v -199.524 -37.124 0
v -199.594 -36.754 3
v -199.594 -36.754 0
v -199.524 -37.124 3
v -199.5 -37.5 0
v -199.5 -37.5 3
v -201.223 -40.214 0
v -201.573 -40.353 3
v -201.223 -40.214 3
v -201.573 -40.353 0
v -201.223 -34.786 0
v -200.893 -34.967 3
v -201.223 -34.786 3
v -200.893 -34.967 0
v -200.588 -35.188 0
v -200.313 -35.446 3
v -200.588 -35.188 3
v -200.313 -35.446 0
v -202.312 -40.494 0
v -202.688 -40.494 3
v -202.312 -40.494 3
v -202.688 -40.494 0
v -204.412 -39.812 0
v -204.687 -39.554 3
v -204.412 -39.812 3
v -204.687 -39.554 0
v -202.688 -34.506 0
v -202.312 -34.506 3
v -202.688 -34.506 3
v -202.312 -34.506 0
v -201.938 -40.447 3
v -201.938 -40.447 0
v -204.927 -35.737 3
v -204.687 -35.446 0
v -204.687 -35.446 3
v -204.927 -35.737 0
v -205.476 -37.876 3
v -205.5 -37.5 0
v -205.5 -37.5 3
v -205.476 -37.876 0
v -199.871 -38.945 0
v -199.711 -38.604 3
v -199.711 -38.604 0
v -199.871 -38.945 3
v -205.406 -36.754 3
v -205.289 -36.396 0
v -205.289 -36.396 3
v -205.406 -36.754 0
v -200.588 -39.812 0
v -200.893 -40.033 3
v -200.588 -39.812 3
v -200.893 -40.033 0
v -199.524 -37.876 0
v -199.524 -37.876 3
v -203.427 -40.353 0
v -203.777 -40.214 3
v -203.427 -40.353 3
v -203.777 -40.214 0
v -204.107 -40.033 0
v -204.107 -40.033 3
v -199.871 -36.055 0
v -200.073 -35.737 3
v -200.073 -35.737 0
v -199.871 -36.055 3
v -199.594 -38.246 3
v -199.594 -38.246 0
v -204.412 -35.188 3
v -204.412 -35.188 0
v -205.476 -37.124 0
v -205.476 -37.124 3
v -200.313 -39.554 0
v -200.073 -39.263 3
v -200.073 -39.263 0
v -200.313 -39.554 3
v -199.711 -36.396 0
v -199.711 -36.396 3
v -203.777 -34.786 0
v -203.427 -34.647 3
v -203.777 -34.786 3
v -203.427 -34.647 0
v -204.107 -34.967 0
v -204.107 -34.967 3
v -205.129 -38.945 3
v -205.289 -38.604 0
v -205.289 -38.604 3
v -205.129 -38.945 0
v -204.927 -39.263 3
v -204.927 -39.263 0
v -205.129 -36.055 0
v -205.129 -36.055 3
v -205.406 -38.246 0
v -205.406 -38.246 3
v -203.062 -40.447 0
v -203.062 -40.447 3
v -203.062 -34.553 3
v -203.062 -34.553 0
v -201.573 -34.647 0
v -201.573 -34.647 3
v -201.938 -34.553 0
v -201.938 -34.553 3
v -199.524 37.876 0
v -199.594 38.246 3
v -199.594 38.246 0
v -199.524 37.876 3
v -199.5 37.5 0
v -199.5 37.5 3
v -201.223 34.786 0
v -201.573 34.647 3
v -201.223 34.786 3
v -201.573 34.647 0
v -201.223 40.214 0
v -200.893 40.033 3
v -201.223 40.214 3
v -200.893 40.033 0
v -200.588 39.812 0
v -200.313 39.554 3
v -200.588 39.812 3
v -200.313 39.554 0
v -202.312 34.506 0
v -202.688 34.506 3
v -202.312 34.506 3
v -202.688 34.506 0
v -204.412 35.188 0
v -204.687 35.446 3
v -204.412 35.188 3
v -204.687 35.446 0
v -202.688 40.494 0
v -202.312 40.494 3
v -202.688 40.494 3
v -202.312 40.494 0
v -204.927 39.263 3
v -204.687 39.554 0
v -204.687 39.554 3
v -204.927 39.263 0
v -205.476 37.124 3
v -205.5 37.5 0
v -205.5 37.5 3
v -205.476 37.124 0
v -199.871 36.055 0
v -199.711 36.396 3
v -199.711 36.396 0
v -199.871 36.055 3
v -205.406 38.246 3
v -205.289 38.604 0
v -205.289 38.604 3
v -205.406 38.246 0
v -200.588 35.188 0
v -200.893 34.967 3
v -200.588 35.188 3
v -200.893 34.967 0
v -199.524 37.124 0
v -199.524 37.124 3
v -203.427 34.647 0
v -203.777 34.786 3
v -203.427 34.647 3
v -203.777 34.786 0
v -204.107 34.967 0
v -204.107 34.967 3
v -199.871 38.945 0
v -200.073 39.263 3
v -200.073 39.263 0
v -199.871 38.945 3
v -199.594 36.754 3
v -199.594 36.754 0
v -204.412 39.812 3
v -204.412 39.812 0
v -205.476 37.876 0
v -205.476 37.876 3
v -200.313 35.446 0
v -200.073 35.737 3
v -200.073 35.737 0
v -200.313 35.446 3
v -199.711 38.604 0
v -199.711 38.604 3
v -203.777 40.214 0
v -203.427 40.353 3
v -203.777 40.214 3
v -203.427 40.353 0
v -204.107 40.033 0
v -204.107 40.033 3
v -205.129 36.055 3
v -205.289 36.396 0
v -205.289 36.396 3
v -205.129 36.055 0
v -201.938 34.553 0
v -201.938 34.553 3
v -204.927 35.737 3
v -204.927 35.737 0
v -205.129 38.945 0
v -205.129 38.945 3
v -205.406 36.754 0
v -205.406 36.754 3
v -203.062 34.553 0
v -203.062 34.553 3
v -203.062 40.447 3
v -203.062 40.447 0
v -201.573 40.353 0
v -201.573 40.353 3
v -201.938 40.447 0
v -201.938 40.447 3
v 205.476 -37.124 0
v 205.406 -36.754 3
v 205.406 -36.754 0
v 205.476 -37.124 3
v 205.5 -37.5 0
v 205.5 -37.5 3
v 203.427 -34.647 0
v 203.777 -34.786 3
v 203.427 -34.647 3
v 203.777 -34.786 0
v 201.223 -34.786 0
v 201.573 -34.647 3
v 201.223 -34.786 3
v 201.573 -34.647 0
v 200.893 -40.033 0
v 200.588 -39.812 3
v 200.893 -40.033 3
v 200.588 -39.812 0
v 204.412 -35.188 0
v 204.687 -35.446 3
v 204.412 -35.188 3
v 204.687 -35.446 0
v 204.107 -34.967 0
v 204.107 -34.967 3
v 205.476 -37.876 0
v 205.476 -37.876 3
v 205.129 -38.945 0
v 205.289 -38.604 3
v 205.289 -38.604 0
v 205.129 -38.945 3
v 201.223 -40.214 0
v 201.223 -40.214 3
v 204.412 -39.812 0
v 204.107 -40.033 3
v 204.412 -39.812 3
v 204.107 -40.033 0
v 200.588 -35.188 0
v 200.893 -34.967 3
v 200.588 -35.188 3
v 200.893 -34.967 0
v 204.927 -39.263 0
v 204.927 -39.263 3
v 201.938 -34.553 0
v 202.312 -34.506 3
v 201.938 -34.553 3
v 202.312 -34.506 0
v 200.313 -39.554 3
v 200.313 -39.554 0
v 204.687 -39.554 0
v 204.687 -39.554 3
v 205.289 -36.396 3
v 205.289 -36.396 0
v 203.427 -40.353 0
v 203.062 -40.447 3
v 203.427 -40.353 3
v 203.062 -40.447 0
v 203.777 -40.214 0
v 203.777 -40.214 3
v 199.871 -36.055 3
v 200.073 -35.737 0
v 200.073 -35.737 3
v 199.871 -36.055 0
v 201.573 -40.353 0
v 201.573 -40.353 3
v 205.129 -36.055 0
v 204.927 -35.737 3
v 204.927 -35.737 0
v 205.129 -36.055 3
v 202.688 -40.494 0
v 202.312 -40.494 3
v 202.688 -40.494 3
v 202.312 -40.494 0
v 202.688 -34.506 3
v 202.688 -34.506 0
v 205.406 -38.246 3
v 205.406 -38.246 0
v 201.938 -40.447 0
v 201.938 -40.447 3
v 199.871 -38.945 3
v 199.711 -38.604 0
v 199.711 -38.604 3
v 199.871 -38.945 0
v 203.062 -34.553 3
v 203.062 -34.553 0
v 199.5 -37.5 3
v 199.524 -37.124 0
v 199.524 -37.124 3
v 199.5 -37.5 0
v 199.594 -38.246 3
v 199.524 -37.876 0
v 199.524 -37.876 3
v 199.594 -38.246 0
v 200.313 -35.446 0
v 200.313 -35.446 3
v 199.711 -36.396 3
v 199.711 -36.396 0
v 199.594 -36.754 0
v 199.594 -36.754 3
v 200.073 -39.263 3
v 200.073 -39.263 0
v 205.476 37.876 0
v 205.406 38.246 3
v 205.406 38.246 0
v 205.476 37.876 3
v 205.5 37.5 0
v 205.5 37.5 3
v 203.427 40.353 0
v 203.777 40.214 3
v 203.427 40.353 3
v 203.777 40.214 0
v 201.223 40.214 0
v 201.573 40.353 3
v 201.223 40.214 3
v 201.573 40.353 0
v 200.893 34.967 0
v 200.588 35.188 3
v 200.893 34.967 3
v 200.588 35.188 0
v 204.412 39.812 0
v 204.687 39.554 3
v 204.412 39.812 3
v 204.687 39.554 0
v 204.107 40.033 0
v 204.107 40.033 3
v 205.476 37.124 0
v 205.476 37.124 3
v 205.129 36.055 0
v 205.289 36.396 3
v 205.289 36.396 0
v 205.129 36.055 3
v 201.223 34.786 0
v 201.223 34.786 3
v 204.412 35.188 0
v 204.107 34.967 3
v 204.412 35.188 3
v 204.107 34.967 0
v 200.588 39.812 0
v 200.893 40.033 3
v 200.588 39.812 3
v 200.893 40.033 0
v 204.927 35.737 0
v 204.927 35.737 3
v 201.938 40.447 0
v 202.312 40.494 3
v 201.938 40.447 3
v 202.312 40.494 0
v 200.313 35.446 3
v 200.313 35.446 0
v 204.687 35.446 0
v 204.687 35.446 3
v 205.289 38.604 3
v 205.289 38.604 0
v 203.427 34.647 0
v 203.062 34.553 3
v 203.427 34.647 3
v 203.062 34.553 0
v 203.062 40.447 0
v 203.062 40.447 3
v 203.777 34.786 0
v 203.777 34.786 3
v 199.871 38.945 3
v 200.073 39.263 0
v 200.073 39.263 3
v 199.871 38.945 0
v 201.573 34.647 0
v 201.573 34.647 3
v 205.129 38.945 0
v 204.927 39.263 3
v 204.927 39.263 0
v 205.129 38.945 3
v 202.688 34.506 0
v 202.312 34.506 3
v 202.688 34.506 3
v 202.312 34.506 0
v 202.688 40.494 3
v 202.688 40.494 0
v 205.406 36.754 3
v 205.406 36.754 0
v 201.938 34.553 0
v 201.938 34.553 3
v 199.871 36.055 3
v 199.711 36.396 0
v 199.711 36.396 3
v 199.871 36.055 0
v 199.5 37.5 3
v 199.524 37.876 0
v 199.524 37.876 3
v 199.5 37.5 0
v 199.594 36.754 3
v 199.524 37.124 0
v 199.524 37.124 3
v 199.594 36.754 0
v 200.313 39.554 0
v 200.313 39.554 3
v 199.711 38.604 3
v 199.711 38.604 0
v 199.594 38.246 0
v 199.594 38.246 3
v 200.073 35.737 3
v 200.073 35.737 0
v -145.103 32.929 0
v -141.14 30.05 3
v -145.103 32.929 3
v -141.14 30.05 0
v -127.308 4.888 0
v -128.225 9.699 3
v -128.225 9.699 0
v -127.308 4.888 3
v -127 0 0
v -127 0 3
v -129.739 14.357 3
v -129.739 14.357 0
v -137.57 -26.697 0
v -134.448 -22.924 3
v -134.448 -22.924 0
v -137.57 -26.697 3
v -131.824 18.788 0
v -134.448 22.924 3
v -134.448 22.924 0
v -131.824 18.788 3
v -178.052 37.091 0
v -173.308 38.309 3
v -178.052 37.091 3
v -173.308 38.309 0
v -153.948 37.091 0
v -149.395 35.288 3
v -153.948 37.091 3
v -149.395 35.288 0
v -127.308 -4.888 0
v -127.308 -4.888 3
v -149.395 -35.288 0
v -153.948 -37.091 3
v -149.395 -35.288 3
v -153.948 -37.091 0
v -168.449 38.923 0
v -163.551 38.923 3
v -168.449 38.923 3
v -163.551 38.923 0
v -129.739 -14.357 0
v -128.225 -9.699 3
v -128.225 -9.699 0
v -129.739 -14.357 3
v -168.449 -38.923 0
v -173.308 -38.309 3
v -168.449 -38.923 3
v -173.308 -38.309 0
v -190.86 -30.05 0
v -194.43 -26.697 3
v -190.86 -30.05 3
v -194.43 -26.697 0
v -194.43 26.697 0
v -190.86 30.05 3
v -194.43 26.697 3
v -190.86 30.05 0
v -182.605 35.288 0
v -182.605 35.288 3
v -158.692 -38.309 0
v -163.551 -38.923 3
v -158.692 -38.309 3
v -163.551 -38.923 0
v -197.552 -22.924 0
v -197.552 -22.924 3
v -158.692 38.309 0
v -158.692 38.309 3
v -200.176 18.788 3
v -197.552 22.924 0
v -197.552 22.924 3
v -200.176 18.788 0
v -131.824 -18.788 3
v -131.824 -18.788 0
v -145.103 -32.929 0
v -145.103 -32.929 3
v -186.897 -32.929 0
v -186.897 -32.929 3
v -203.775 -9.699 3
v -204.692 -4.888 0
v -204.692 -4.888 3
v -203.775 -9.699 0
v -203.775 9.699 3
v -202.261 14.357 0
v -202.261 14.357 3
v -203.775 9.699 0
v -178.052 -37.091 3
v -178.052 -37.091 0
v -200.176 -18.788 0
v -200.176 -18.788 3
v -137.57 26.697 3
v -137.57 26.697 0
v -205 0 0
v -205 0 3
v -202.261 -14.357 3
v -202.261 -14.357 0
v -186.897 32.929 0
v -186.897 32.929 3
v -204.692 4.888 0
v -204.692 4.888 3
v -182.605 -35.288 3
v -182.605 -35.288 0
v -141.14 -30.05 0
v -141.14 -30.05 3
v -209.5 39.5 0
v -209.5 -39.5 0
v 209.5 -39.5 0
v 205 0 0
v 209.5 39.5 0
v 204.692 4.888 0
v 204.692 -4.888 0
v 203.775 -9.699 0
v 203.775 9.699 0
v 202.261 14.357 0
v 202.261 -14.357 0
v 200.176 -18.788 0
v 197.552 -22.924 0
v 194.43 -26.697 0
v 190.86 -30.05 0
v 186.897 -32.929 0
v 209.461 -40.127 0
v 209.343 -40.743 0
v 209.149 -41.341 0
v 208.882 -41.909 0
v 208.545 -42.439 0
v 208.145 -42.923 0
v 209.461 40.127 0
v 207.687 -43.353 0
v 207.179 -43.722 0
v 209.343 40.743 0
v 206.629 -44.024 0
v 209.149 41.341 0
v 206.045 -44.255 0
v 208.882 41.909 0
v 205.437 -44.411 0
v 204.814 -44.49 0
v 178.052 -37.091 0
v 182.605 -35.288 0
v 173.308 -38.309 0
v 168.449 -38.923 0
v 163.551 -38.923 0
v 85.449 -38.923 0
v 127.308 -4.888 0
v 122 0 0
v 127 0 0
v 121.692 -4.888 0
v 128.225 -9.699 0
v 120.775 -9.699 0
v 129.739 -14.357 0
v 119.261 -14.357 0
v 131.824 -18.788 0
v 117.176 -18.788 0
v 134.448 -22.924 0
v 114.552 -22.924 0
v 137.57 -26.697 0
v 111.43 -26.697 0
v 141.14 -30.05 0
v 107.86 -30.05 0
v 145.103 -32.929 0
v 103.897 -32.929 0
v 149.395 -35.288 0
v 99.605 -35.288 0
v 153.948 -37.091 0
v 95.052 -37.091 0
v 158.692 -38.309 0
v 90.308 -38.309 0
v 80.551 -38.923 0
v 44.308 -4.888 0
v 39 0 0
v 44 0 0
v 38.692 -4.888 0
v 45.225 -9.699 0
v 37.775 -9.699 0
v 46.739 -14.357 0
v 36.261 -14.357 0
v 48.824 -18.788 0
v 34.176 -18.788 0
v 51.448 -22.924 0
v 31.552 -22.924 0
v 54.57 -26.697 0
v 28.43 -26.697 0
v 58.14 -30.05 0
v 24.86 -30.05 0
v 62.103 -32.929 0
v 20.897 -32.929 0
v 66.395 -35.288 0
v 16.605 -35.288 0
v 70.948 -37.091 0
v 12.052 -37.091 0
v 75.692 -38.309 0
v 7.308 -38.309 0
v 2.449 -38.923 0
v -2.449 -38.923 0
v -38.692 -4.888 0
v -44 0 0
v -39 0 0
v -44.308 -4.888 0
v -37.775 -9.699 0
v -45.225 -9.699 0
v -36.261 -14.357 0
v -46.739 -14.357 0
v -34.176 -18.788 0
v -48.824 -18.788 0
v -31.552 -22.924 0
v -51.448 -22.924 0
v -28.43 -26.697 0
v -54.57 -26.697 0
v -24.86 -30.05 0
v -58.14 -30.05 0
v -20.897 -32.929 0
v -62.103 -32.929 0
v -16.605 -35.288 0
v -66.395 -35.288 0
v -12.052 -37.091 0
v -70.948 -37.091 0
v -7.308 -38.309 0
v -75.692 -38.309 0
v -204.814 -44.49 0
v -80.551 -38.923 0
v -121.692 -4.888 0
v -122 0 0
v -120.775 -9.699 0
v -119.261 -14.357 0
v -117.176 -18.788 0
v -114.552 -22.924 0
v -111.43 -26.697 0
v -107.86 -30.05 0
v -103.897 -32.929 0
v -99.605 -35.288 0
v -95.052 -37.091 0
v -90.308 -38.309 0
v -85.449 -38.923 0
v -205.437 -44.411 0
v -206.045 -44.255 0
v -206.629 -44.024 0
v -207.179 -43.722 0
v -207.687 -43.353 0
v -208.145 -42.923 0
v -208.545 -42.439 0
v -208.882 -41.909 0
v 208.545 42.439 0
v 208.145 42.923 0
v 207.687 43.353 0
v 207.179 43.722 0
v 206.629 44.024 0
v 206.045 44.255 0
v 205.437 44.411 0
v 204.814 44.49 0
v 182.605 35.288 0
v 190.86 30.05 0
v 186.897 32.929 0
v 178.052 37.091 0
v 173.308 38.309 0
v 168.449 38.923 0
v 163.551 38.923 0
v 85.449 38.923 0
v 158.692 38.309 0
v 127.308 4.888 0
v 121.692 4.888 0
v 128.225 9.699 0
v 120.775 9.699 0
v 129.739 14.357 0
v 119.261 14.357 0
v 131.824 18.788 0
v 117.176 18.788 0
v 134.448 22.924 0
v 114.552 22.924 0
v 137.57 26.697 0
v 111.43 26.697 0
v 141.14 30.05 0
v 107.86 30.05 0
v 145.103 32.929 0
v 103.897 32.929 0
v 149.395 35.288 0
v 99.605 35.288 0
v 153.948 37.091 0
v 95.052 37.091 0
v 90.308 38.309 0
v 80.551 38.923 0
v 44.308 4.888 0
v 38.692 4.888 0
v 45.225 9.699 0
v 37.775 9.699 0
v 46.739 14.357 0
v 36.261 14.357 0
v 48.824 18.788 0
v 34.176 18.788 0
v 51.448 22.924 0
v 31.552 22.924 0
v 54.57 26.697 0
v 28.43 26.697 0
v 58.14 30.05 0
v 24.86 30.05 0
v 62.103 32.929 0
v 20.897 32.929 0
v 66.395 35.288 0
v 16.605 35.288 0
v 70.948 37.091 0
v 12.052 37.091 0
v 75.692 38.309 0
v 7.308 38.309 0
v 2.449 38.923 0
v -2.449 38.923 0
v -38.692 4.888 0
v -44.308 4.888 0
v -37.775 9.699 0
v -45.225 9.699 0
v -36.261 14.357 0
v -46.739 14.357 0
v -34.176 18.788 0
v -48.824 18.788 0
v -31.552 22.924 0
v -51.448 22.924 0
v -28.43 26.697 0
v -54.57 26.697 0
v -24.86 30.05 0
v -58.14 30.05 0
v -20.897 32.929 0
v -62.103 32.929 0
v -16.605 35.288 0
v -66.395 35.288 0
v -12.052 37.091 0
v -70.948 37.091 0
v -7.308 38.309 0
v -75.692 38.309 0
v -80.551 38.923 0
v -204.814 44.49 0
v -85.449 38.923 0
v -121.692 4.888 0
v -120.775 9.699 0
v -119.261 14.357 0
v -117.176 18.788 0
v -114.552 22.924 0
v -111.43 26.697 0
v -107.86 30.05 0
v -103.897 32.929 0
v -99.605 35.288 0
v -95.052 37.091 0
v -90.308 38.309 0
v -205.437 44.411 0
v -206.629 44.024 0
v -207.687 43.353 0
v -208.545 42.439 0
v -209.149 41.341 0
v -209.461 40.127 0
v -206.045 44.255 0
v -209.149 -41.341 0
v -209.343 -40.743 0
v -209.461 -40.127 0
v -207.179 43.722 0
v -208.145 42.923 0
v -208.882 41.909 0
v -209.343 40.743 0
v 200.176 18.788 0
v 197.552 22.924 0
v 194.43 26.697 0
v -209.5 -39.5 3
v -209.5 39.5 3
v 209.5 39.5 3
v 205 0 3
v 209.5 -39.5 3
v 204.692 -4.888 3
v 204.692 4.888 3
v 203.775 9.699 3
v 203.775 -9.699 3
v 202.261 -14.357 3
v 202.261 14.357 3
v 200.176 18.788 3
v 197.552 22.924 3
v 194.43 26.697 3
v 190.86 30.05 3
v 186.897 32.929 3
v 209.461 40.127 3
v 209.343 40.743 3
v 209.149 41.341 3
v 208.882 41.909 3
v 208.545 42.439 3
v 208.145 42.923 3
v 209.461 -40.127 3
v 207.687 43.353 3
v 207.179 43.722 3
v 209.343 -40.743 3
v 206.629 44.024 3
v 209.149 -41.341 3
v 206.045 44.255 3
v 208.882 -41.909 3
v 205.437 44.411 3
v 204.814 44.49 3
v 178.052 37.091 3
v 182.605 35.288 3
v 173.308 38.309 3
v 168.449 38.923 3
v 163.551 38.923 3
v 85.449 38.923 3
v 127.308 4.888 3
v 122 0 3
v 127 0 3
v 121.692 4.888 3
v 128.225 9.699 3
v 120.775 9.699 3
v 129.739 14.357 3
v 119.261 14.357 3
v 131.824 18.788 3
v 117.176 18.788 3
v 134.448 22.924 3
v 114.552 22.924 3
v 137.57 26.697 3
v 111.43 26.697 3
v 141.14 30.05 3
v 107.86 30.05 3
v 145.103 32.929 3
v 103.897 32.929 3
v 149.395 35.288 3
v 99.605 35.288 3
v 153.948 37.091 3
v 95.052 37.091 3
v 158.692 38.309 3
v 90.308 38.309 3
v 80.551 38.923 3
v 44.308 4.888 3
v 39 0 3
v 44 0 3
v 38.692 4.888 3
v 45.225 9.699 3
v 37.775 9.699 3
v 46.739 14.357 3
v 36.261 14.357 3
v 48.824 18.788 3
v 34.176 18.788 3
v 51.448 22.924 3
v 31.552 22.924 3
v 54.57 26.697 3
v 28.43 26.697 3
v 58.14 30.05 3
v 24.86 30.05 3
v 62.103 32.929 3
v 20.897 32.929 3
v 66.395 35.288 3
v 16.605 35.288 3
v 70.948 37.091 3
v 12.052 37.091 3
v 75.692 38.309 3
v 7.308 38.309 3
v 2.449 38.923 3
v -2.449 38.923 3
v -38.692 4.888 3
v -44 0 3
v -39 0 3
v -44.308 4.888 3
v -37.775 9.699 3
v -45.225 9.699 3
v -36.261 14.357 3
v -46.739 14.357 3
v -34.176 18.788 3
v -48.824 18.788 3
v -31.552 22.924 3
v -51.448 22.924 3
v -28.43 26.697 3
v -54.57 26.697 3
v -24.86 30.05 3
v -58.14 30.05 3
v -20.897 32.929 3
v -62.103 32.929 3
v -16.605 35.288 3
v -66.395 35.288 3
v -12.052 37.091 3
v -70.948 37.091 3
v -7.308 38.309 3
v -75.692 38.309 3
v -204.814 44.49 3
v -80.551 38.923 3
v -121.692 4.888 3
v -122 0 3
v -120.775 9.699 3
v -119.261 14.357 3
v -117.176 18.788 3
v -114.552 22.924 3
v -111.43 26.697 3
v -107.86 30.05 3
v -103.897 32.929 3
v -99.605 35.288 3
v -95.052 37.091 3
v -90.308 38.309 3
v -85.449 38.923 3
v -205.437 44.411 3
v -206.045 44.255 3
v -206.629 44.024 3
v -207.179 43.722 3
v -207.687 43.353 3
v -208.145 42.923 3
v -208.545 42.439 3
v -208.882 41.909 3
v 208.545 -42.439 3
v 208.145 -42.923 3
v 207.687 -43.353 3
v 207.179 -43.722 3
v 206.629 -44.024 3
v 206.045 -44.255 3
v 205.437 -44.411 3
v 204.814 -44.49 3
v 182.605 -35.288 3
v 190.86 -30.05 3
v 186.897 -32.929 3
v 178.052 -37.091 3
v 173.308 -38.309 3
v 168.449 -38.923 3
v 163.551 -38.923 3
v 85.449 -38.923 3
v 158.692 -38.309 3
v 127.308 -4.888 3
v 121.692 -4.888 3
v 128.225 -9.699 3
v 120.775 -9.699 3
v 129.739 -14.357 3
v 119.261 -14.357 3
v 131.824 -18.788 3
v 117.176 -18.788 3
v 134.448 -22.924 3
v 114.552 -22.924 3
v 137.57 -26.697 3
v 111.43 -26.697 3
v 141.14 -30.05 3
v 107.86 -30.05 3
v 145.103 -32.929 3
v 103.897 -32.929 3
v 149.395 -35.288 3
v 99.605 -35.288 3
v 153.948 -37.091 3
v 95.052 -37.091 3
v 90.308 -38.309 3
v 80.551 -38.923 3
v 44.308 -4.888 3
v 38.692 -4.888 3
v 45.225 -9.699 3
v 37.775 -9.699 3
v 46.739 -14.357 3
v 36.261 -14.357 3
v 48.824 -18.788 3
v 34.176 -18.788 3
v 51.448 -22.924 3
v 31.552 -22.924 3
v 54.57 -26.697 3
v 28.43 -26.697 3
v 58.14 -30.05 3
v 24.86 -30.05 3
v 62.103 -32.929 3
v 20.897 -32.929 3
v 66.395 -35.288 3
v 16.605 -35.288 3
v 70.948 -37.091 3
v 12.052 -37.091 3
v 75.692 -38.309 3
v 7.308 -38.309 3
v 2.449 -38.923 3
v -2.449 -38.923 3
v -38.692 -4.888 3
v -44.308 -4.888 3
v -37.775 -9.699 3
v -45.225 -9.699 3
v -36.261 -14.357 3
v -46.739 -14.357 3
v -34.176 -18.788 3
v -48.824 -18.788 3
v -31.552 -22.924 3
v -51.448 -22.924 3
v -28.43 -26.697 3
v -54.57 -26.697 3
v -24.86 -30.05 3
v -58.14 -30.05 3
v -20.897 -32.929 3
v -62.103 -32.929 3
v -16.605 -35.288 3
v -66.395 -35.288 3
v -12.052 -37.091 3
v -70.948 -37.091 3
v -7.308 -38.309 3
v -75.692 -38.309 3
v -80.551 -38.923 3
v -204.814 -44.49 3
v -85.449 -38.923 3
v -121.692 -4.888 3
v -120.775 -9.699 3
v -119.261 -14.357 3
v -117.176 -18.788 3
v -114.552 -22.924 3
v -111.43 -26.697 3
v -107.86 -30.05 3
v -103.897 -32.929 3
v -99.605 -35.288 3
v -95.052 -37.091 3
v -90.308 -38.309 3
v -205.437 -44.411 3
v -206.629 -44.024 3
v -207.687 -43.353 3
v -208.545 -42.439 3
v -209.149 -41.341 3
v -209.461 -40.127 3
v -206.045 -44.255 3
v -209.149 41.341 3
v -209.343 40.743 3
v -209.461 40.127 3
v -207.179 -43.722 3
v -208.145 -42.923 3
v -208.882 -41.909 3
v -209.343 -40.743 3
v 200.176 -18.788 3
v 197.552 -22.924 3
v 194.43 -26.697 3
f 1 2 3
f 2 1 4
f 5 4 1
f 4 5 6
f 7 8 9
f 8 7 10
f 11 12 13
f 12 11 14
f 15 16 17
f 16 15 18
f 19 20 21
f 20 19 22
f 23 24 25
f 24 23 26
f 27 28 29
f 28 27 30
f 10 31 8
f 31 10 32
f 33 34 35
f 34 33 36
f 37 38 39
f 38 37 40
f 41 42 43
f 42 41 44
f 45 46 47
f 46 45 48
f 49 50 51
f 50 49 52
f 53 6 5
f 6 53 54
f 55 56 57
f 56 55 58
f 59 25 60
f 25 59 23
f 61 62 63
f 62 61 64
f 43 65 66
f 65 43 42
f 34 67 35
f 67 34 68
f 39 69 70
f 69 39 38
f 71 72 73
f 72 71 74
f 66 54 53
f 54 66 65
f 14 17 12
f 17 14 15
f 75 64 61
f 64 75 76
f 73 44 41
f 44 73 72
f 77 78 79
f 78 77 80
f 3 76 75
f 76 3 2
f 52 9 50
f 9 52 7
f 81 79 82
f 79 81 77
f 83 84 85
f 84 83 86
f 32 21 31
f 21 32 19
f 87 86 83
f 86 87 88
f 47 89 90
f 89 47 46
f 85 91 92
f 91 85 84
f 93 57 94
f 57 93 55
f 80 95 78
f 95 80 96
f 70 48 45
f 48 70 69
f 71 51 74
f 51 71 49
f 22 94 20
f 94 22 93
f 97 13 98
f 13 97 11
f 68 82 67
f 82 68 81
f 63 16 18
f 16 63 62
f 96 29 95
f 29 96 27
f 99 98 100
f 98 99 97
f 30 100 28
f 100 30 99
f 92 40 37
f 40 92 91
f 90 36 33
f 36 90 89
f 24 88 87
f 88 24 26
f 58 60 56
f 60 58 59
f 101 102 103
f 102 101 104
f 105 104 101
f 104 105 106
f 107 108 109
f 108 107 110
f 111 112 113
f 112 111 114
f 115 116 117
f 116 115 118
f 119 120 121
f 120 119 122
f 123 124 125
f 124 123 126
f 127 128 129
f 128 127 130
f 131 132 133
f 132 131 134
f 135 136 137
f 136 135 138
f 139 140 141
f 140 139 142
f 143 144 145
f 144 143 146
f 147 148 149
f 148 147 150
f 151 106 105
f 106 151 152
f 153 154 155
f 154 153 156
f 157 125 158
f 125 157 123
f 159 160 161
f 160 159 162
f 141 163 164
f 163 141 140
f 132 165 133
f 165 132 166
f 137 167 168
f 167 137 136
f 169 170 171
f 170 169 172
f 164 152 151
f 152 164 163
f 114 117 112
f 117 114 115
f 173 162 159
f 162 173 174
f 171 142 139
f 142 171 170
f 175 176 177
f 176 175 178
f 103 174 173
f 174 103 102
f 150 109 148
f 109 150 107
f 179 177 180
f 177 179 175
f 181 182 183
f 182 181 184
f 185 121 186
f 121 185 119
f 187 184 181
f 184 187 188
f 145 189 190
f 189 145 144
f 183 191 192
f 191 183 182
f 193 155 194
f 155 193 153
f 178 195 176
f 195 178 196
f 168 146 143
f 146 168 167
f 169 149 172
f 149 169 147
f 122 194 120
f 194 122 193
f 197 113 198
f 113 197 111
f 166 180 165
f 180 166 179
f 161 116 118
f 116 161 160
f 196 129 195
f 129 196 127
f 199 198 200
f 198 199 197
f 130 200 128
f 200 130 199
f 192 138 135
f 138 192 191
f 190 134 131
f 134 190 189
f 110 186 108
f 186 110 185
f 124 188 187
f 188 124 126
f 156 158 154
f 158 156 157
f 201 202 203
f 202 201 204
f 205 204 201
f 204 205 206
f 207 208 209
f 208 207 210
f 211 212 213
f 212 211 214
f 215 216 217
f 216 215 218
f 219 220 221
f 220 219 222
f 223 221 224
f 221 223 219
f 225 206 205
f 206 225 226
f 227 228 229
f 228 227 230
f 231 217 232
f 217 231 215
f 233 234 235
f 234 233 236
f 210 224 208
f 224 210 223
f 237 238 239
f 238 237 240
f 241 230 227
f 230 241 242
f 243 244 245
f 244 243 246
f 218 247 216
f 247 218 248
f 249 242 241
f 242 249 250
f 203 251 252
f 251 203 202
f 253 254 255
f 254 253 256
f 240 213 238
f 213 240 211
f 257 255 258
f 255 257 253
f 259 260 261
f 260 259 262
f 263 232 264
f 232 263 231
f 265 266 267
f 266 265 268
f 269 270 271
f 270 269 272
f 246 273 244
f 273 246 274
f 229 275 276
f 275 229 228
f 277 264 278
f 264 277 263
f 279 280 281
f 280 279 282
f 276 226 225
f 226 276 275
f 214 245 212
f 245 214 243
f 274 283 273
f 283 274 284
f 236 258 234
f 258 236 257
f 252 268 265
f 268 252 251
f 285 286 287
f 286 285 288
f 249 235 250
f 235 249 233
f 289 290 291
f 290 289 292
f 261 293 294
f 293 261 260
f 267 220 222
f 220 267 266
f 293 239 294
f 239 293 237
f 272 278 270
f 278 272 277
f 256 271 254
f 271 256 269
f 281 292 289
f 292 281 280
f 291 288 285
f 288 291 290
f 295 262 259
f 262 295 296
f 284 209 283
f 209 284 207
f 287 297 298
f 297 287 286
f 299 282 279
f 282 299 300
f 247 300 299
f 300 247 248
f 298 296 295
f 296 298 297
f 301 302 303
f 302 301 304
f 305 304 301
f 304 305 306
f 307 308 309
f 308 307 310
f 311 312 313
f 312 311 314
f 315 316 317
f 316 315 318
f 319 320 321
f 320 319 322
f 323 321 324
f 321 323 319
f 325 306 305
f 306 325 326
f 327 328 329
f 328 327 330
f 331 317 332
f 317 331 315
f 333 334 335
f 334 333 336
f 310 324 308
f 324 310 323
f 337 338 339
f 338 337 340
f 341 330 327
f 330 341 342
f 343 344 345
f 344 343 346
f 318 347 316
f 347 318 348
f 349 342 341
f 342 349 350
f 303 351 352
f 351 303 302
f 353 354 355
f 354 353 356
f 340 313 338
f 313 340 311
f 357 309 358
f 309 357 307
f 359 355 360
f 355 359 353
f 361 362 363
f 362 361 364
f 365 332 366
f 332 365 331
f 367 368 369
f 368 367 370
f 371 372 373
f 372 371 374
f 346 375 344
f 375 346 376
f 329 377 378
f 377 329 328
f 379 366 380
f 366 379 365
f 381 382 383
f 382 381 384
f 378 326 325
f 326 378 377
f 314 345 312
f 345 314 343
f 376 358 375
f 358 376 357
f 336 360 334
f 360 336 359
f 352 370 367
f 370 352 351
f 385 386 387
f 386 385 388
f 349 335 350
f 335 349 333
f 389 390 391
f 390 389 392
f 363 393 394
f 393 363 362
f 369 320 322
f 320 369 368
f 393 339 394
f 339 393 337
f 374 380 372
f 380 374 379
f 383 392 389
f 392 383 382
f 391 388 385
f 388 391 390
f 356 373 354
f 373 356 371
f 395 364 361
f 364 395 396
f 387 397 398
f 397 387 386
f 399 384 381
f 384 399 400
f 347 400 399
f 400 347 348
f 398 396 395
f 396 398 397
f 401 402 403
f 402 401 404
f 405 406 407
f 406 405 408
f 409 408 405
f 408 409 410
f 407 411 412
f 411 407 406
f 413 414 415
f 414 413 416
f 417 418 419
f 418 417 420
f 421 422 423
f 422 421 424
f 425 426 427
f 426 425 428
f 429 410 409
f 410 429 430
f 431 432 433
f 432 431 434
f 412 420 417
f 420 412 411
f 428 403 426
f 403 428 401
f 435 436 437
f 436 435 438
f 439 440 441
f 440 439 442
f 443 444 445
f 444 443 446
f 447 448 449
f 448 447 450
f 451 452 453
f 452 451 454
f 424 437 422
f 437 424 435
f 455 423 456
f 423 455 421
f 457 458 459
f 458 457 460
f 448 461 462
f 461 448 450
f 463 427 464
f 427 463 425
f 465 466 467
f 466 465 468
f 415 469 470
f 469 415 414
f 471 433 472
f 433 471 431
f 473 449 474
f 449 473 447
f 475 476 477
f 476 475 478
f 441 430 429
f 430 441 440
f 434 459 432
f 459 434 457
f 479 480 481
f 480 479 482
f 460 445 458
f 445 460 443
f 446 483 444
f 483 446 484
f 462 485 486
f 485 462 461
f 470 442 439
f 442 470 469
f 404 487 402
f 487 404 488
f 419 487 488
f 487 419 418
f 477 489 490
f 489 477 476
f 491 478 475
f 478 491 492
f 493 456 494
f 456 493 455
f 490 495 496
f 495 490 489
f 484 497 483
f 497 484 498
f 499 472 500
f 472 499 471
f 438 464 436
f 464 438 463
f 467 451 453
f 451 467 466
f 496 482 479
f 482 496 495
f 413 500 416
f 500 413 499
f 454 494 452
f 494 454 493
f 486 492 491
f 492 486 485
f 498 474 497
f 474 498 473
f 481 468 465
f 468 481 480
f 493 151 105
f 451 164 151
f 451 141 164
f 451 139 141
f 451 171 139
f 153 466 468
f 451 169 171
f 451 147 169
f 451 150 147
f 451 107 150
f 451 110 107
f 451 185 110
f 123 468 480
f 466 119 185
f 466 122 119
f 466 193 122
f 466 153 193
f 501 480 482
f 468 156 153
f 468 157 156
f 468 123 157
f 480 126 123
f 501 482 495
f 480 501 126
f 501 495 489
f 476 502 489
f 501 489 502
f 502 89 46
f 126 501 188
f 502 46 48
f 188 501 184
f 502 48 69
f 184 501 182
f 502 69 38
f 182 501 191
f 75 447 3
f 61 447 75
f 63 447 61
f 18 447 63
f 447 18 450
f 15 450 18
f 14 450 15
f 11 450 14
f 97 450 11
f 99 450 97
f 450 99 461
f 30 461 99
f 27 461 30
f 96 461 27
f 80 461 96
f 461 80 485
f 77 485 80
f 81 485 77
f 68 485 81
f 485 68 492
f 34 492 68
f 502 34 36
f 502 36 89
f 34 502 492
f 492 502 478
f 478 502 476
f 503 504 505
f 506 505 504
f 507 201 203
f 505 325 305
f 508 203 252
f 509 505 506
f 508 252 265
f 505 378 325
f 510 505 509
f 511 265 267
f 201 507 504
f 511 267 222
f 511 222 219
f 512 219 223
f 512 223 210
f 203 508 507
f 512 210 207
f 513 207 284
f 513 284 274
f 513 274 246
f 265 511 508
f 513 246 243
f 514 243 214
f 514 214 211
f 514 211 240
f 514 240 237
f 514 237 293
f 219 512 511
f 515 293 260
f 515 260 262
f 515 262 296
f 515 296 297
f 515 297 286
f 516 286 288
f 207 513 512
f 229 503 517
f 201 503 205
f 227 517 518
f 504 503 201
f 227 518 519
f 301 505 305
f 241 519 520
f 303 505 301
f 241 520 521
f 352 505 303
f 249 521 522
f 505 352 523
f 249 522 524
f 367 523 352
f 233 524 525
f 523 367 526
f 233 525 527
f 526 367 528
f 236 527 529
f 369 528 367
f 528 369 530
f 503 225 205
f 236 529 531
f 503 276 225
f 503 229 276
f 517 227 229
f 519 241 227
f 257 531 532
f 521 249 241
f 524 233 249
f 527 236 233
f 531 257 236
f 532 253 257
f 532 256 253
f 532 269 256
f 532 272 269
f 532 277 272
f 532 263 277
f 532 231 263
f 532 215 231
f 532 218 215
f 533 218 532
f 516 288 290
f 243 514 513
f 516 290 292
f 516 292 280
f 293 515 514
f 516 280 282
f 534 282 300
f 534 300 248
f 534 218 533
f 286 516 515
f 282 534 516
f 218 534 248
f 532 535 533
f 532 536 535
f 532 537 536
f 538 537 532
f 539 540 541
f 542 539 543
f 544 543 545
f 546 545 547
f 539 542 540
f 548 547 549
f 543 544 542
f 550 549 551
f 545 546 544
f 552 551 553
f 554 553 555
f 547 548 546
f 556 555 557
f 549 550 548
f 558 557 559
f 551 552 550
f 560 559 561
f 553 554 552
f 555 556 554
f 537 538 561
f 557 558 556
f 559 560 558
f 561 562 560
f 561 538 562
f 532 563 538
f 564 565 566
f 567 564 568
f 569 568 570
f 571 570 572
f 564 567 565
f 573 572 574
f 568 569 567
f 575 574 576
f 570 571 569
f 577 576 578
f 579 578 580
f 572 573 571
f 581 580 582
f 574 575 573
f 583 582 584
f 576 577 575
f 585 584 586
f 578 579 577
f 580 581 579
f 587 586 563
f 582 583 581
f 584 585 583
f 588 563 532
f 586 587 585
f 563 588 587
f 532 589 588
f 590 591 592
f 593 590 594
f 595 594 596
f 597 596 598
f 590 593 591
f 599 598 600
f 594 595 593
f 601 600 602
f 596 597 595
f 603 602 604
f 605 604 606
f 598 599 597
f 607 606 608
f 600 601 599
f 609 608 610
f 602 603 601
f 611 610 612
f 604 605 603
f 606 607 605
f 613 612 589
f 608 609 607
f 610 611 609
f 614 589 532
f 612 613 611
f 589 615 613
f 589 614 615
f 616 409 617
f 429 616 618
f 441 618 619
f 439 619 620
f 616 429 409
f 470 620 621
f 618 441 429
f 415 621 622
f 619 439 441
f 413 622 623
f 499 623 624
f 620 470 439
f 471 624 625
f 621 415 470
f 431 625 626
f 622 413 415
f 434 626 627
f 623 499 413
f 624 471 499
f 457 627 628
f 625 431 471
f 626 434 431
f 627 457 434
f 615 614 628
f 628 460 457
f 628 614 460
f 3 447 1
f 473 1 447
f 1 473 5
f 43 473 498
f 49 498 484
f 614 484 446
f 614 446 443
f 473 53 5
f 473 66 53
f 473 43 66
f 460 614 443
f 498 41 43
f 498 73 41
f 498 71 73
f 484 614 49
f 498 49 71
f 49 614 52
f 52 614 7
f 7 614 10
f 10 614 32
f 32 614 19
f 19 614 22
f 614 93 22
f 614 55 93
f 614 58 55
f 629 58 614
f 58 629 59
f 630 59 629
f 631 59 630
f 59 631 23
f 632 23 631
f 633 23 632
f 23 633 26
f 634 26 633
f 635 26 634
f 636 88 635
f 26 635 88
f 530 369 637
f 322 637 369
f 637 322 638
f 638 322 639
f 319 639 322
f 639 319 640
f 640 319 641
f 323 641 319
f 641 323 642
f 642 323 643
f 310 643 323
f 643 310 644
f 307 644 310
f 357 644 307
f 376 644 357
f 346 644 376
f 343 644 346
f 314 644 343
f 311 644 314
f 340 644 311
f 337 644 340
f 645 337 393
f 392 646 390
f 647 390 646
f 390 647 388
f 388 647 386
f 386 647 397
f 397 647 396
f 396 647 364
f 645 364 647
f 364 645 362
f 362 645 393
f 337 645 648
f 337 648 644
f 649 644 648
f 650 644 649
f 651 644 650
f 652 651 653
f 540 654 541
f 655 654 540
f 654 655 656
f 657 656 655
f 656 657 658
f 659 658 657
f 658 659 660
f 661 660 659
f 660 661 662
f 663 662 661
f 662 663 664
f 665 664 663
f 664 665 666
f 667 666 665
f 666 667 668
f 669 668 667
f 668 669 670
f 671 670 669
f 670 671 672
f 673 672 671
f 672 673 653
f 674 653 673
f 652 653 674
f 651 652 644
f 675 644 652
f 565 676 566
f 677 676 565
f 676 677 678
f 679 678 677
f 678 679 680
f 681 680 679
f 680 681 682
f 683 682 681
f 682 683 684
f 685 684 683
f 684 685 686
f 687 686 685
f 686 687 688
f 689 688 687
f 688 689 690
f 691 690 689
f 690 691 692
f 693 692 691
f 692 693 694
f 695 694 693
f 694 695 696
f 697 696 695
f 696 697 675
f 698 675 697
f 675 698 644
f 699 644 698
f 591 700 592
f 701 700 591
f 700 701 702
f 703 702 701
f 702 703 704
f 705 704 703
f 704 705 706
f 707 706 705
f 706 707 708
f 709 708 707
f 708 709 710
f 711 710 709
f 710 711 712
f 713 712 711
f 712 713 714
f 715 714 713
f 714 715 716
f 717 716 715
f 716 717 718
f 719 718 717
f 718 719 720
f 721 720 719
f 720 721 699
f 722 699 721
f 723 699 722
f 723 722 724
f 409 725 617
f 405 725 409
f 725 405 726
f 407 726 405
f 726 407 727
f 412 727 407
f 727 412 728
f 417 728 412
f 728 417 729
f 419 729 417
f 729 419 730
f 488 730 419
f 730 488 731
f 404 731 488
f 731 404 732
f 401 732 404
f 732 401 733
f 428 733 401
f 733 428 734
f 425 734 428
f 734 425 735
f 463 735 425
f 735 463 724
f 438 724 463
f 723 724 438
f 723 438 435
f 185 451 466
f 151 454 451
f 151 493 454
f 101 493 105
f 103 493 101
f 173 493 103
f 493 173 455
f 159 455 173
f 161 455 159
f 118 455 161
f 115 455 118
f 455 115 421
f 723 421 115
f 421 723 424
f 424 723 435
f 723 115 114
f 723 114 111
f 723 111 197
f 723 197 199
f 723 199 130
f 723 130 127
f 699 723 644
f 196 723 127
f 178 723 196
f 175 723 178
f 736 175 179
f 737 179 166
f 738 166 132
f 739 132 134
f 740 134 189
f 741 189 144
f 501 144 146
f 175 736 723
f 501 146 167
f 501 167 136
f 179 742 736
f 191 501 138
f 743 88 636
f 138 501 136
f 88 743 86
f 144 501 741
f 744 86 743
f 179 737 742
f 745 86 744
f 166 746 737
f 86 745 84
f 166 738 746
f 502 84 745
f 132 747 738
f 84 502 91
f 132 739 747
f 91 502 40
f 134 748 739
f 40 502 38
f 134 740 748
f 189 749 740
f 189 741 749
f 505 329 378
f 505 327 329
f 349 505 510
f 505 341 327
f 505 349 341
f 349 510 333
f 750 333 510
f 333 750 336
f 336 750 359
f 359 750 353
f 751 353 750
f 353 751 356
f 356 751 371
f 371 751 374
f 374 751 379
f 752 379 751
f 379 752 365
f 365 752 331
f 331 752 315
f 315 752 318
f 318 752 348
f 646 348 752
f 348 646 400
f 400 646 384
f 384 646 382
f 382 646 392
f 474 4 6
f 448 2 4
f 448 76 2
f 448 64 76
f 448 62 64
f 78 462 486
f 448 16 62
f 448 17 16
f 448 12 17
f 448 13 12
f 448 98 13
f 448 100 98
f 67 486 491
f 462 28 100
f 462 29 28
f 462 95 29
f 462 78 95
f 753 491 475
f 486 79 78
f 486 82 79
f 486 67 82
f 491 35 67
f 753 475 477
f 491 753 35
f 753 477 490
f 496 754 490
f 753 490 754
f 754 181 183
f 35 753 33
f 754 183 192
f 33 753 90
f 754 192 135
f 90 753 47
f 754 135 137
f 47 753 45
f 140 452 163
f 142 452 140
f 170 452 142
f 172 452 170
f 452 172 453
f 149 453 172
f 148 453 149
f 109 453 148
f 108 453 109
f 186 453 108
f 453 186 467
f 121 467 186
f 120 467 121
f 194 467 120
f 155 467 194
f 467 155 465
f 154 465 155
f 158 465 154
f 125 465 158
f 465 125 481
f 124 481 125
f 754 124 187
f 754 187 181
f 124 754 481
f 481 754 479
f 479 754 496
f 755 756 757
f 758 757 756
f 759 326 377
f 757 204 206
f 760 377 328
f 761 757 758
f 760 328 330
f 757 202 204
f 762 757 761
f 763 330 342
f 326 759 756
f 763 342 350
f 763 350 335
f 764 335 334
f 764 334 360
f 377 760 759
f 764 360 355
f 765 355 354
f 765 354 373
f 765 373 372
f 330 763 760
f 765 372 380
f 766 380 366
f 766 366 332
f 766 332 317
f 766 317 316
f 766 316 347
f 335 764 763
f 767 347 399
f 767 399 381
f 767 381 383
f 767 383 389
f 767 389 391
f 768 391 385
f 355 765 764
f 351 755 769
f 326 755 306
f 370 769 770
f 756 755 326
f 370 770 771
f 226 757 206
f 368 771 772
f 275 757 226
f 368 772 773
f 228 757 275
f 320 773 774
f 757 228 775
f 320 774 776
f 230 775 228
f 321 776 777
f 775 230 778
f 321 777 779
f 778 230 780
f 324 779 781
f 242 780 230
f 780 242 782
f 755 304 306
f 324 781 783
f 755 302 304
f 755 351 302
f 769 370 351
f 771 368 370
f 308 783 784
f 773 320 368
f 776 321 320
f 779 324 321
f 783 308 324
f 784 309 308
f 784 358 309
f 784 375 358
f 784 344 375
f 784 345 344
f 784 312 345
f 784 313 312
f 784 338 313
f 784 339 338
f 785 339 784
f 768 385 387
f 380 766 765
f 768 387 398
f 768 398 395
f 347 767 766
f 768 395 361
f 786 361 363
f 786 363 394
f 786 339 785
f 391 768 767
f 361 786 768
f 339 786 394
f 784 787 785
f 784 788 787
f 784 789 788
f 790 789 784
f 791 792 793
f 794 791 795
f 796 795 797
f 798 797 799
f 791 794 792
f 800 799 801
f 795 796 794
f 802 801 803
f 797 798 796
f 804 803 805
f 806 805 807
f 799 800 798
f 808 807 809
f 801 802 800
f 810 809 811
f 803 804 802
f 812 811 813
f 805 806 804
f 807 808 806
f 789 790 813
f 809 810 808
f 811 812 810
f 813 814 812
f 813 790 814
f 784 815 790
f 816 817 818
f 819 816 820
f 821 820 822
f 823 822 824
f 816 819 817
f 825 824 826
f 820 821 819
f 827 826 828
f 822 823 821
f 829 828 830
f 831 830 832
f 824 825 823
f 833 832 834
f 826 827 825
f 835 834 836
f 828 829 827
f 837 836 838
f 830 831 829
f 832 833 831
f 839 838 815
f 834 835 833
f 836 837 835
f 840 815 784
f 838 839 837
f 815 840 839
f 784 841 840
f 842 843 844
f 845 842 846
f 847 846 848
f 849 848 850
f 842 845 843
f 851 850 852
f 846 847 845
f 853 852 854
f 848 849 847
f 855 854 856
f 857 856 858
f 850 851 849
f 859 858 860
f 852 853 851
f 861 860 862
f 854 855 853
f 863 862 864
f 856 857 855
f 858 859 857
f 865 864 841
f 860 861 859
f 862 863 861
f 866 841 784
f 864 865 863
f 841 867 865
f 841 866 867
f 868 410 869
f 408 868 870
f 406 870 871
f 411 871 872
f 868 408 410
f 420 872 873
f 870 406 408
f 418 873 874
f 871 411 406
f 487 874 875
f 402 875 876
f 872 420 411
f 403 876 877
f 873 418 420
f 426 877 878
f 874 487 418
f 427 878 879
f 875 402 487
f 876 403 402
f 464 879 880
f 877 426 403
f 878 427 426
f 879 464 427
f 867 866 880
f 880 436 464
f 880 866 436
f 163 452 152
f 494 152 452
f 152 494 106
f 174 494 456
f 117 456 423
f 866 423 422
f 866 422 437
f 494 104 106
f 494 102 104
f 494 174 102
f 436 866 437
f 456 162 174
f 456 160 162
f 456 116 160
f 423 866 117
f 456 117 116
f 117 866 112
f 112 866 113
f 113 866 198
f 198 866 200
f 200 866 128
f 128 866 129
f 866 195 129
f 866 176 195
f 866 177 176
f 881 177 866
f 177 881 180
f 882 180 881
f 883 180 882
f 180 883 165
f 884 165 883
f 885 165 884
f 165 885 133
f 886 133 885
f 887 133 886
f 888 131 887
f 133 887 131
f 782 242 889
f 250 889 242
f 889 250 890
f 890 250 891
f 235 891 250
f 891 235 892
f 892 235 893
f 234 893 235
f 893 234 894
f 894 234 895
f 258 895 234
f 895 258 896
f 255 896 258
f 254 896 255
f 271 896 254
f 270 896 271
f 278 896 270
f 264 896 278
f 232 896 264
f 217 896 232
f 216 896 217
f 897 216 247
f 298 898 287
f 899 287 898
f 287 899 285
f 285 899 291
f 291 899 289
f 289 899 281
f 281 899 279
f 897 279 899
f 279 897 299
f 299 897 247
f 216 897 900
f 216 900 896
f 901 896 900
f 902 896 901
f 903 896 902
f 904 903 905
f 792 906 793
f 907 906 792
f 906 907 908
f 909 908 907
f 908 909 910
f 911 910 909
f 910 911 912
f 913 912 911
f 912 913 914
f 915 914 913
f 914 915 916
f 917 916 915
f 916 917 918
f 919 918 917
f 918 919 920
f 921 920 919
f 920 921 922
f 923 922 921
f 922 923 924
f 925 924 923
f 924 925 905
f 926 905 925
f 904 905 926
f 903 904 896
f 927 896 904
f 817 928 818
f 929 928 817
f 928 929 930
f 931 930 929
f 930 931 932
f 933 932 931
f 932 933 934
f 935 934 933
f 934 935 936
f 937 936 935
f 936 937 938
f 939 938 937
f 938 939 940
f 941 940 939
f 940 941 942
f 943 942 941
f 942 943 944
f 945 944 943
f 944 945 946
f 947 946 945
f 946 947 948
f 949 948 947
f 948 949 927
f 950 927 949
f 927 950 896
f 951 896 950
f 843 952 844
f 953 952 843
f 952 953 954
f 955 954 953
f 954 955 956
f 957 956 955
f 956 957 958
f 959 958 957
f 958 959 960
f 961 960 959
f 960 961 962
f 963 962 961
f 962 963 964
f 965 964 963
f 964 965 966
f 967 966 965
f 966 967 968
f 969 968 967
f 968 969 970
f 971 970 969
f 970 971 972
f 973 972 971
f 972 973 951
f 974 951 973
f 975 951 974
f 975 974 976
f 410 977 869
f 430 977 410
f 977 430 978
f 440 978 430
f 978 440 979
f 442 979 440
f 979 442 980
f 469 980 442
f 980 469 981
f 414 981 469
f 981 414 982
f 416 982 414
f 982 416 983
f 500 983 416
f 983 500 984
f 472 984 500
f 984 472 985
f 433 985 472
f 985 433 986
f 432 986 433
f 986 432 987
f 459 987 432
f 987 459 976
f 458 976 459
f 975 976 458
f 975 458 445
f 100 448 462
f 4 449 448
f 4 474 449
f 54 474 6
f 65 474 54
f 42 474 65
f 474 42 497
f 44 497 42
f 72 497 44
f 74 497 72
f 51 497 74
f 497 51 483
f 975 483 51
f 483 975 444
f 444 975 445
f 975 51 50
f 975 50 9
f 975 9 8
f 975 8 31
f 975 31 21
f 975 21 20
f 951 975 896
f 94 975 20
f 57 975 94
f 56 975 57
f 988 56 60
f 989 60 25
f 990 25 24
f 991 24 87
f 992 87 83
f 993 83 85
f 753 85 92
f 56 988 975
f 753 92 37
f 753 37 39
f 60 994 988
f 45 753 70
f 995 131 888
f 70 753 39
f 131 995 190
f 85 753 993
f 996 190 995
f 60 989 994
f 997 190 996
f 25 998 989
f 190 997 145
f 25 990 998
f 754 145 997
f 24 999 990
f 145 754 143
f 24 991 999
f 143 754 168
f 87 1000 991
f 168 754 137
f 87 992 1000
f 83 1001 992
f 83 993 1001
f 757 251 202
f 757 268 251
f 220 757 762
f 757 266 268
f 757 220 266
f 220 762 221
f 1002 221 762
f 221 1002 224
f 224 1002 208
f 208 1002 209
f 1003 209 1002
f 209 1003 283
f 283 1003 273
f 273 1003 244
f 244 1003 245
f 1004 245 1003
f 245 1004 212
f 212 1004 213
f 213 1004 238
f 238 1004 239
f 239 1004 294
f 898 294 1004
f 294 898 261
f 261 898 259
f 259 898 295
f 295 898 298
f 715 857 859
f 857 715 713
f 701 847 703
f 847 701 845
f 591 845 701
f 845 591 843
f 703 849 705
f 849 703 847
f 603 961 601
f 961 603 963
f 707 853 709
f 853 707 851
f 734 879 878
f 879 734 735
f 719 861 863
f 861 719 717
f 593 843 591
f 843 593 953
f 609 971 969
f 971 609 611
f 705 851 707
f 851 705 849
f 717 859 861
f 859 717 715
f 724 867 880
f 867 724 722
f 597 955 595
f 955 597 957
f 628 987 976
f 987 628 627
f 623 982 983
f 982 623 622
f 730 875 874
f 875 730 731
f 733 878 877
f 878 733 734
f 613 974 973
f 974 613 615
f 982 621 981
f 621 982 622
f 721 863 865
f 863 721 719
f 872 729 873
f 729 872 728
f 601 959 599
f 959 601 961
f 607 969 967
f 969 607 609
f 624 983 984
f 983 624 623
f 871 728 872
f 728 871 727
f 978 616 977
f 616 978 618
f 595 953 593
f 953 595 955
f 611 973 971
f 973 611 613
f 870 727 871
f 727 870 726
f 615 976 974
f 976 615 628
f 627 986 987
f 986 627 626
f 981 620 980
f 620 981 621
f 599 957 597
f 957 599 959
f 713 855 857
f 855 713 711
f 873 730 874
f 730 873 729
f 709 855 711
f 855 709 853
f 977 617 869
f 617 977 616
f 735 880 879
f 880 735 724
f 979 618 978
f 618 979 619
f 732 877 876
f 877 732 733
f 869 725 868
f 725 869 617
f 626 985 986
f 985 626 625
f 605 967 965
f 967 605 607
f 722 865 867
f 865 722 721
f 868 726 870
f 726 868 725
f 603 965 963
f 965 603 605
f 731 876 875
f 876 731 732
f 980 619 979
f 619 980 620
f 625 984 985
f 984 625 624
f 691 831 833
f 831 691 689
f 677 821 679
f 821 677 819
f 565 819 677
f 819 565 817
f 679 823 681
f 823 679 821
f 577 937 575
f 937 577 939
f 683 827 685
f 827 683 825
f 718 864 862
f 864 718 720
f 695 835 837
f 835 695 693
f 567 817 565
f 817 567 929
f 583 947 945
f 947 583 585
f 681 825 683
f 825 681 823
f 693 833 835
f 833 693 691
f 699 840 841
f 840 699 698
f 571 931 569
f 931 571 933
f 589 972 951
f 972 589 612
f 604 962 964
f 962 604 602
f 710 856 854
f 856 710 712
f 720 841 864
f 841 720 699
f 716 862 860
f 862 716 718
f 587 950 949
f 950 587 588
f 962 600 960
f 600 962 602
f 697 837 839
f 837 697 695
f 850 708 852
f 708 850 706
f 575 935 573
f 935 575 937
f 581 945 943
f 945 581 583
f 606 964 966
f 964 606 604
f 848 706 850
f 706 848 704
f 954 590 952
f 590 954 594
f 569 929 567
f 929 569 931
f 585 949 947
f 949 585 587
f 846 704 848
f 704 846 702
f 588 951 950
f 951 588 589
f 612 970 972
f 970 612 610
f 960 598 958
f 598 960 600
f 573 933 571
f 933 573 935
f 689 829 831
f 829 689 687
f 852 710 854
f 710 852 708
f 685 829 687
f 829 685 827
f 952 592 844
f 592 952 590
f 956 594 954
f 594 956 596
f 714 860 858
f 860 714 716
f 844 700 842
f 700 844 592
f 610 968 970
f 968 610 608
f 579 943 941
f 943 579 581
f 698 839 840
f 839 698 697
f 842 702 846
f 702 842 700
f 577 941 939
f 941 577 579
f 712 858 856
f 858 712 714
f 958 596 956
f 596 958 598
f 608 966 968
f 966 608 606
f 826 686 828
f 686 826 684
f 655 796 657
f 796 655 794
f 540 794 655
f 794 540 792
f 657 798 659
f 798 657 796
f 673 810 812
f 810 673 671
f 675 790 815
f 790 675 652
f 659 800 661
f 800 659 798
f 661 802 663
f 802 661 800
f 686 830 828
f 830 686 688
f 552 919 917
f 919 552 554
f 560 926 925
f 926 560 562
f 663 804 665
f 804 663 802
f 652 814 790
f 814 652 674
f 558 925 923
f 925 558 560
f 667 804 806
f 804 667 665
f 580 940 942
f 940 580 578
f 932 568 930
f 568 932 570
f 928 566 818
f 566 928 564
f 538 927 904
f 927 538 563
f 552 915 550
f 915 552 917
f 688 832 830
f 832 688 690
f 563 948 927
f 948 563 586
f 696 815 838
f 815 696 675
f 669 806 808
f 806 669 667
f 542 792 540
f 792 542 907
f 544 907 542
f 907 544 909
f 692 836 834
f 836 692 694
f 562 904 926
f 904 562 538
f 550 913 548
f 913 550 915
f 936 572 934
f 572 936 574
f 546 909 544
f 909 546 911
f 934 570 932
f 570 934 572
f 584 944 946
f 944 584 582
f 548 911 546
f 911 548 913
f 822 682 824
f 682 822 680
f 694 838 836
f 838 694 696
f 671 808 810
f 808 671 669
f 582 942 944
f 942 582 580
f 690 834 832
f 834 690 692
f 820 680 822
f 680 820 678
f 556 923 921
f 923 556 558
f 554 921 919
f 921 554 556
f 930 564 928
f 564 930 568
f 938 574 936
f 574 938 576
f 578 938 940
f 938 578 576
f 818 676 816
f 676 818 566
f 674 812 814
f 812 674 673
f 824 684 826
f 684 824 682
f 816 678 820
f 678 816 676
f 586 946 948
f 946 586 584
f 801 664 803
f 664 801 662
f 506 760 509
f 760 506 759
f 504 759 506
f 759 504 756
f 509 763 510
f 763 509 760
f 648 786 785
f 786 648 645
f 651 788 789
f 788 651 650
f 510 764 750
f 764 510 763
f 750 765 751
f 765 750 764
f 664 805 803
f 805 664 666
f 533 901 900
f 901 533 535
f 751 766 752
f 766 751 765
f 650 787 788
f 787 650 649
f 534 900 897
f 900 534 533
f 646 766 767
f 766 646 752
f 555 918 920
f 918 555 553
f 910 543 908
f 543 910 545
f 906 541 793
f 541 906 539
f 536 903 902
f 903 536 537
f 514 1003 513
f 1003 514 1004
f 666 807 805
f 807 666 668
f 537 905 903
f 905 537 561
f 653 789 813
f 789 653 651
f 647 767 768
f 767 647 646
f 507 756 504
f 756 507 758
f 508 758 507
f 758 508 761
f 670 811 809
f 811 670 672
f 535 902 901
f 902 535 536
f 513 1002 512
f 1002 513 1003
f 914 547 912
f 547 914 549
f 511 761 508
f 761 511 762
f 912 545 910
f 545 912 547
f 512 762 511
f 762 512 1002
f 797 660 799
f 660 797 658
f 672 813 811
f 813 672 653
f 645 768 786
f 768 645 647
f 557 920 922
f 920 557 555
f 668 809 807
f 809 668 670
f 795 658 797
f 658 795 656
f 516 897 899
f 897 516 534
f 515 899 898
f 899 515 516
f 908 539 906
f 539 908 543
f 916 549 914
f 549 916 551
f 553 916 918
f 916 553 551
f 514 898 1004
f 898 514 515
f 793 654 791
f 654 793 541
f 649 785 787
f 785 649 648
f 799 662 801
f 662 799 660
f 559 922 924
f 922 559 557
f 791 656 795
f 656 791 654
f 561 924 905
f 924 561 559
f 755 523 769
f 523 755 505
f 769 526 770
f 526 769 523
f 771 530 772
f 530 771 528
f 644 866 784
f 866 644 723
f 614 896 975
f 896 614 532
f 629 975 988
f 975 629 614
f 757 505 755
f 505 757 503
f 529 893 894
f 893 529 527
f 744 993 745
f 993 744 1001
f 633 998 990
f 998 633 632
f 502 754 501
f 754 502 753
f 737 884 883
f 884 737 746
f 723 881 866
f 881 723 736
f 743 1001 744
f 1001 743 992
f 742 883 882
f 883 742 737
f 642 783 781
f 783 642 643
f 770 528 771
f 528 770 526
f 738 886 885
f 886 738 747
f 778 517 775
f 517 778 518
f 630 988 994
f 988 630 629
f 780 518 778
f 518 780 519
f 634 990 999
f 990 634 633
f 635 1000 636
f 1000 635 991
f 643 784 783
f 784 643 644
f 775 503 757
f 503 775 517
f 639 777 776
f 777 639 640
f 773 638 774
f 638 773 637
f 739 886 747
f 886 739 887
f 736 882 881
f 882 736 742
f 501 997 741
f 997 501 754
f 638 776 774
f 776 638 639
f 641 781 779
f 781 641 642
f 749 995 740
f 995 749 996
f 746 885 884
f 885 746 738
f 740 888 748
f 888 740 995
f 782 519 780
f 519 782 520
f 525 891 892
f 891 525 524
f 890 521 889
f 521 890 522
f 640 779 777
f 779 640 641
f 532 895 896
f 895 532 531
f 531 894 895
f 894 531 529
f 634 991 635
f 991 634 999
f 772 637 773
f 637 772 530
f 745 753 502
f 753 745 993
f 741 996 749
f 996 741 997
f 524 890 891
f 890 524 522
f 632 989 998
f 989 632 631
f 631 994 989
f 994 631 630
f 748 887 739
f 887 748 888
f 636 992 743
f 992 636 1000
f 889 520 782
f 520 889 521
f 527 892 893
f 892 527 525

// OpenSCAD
$fn = 50;


difference() {
	union() {
		hull() {
			translate(v = [-204.5000000000, 39.5000000000, 0]) {
				cylinder(h = 3, r = 5);
			}
			translate(v = [204.5000000000, 39.5000000000, 0]) {
				cylinder(h = 3, r = 5);
			}
			translate(v = [-204.5000000000, -39.5000000000, 0]) {
				cylinder(h = 3, r = 5);
			}
			translate(v = [204.5000000000, -39.5000000000, 0]) {
				cylinder(h = 3, r = 5);
			}
		}
	}
	union() {
		#translate(v = [-202.5000000000, -37.5000000000, -100.0000000000]) {
			cylinder(h = 200, r = 3.0000000000);
		}
		#translate(v = [-202.5000000000, 37.5000000000, -100.0000000000]) {
			cylinder(h = 200, r = 3.0000000000);
		}
		#translate(v = [202.5000000000, -37.5000000000, -100.0000000000]) {
			cylinder(h = 200, r = 3.0000000000);
		}
		#translate(v = [202.5000000000, 37.5000000000, -100.0000000000]) {
			cylinder(h = 200, r = 3.0000000000);
		}
		#translate(v = [-166.0000000000, 0, 0]) {
			cylinder(h = 3, r = 39.0000000000);
		}
		#translate(v = [-83.0000000000, 0, 0]) {
			cylinder(h = 3, r = 39.0000000000);
		}
		#cylinder(h = 3, r = 39.0000000000);
		#translate(v = [83.0000000000, 0, 0]) {
			cylinder(h = 3, r = 39.0000000000);
		}
		#translate(v = [166.0000000000, 0, 0]) {
			cylinder(h = 3, r = 39.0000000000);
		}
	}
}
